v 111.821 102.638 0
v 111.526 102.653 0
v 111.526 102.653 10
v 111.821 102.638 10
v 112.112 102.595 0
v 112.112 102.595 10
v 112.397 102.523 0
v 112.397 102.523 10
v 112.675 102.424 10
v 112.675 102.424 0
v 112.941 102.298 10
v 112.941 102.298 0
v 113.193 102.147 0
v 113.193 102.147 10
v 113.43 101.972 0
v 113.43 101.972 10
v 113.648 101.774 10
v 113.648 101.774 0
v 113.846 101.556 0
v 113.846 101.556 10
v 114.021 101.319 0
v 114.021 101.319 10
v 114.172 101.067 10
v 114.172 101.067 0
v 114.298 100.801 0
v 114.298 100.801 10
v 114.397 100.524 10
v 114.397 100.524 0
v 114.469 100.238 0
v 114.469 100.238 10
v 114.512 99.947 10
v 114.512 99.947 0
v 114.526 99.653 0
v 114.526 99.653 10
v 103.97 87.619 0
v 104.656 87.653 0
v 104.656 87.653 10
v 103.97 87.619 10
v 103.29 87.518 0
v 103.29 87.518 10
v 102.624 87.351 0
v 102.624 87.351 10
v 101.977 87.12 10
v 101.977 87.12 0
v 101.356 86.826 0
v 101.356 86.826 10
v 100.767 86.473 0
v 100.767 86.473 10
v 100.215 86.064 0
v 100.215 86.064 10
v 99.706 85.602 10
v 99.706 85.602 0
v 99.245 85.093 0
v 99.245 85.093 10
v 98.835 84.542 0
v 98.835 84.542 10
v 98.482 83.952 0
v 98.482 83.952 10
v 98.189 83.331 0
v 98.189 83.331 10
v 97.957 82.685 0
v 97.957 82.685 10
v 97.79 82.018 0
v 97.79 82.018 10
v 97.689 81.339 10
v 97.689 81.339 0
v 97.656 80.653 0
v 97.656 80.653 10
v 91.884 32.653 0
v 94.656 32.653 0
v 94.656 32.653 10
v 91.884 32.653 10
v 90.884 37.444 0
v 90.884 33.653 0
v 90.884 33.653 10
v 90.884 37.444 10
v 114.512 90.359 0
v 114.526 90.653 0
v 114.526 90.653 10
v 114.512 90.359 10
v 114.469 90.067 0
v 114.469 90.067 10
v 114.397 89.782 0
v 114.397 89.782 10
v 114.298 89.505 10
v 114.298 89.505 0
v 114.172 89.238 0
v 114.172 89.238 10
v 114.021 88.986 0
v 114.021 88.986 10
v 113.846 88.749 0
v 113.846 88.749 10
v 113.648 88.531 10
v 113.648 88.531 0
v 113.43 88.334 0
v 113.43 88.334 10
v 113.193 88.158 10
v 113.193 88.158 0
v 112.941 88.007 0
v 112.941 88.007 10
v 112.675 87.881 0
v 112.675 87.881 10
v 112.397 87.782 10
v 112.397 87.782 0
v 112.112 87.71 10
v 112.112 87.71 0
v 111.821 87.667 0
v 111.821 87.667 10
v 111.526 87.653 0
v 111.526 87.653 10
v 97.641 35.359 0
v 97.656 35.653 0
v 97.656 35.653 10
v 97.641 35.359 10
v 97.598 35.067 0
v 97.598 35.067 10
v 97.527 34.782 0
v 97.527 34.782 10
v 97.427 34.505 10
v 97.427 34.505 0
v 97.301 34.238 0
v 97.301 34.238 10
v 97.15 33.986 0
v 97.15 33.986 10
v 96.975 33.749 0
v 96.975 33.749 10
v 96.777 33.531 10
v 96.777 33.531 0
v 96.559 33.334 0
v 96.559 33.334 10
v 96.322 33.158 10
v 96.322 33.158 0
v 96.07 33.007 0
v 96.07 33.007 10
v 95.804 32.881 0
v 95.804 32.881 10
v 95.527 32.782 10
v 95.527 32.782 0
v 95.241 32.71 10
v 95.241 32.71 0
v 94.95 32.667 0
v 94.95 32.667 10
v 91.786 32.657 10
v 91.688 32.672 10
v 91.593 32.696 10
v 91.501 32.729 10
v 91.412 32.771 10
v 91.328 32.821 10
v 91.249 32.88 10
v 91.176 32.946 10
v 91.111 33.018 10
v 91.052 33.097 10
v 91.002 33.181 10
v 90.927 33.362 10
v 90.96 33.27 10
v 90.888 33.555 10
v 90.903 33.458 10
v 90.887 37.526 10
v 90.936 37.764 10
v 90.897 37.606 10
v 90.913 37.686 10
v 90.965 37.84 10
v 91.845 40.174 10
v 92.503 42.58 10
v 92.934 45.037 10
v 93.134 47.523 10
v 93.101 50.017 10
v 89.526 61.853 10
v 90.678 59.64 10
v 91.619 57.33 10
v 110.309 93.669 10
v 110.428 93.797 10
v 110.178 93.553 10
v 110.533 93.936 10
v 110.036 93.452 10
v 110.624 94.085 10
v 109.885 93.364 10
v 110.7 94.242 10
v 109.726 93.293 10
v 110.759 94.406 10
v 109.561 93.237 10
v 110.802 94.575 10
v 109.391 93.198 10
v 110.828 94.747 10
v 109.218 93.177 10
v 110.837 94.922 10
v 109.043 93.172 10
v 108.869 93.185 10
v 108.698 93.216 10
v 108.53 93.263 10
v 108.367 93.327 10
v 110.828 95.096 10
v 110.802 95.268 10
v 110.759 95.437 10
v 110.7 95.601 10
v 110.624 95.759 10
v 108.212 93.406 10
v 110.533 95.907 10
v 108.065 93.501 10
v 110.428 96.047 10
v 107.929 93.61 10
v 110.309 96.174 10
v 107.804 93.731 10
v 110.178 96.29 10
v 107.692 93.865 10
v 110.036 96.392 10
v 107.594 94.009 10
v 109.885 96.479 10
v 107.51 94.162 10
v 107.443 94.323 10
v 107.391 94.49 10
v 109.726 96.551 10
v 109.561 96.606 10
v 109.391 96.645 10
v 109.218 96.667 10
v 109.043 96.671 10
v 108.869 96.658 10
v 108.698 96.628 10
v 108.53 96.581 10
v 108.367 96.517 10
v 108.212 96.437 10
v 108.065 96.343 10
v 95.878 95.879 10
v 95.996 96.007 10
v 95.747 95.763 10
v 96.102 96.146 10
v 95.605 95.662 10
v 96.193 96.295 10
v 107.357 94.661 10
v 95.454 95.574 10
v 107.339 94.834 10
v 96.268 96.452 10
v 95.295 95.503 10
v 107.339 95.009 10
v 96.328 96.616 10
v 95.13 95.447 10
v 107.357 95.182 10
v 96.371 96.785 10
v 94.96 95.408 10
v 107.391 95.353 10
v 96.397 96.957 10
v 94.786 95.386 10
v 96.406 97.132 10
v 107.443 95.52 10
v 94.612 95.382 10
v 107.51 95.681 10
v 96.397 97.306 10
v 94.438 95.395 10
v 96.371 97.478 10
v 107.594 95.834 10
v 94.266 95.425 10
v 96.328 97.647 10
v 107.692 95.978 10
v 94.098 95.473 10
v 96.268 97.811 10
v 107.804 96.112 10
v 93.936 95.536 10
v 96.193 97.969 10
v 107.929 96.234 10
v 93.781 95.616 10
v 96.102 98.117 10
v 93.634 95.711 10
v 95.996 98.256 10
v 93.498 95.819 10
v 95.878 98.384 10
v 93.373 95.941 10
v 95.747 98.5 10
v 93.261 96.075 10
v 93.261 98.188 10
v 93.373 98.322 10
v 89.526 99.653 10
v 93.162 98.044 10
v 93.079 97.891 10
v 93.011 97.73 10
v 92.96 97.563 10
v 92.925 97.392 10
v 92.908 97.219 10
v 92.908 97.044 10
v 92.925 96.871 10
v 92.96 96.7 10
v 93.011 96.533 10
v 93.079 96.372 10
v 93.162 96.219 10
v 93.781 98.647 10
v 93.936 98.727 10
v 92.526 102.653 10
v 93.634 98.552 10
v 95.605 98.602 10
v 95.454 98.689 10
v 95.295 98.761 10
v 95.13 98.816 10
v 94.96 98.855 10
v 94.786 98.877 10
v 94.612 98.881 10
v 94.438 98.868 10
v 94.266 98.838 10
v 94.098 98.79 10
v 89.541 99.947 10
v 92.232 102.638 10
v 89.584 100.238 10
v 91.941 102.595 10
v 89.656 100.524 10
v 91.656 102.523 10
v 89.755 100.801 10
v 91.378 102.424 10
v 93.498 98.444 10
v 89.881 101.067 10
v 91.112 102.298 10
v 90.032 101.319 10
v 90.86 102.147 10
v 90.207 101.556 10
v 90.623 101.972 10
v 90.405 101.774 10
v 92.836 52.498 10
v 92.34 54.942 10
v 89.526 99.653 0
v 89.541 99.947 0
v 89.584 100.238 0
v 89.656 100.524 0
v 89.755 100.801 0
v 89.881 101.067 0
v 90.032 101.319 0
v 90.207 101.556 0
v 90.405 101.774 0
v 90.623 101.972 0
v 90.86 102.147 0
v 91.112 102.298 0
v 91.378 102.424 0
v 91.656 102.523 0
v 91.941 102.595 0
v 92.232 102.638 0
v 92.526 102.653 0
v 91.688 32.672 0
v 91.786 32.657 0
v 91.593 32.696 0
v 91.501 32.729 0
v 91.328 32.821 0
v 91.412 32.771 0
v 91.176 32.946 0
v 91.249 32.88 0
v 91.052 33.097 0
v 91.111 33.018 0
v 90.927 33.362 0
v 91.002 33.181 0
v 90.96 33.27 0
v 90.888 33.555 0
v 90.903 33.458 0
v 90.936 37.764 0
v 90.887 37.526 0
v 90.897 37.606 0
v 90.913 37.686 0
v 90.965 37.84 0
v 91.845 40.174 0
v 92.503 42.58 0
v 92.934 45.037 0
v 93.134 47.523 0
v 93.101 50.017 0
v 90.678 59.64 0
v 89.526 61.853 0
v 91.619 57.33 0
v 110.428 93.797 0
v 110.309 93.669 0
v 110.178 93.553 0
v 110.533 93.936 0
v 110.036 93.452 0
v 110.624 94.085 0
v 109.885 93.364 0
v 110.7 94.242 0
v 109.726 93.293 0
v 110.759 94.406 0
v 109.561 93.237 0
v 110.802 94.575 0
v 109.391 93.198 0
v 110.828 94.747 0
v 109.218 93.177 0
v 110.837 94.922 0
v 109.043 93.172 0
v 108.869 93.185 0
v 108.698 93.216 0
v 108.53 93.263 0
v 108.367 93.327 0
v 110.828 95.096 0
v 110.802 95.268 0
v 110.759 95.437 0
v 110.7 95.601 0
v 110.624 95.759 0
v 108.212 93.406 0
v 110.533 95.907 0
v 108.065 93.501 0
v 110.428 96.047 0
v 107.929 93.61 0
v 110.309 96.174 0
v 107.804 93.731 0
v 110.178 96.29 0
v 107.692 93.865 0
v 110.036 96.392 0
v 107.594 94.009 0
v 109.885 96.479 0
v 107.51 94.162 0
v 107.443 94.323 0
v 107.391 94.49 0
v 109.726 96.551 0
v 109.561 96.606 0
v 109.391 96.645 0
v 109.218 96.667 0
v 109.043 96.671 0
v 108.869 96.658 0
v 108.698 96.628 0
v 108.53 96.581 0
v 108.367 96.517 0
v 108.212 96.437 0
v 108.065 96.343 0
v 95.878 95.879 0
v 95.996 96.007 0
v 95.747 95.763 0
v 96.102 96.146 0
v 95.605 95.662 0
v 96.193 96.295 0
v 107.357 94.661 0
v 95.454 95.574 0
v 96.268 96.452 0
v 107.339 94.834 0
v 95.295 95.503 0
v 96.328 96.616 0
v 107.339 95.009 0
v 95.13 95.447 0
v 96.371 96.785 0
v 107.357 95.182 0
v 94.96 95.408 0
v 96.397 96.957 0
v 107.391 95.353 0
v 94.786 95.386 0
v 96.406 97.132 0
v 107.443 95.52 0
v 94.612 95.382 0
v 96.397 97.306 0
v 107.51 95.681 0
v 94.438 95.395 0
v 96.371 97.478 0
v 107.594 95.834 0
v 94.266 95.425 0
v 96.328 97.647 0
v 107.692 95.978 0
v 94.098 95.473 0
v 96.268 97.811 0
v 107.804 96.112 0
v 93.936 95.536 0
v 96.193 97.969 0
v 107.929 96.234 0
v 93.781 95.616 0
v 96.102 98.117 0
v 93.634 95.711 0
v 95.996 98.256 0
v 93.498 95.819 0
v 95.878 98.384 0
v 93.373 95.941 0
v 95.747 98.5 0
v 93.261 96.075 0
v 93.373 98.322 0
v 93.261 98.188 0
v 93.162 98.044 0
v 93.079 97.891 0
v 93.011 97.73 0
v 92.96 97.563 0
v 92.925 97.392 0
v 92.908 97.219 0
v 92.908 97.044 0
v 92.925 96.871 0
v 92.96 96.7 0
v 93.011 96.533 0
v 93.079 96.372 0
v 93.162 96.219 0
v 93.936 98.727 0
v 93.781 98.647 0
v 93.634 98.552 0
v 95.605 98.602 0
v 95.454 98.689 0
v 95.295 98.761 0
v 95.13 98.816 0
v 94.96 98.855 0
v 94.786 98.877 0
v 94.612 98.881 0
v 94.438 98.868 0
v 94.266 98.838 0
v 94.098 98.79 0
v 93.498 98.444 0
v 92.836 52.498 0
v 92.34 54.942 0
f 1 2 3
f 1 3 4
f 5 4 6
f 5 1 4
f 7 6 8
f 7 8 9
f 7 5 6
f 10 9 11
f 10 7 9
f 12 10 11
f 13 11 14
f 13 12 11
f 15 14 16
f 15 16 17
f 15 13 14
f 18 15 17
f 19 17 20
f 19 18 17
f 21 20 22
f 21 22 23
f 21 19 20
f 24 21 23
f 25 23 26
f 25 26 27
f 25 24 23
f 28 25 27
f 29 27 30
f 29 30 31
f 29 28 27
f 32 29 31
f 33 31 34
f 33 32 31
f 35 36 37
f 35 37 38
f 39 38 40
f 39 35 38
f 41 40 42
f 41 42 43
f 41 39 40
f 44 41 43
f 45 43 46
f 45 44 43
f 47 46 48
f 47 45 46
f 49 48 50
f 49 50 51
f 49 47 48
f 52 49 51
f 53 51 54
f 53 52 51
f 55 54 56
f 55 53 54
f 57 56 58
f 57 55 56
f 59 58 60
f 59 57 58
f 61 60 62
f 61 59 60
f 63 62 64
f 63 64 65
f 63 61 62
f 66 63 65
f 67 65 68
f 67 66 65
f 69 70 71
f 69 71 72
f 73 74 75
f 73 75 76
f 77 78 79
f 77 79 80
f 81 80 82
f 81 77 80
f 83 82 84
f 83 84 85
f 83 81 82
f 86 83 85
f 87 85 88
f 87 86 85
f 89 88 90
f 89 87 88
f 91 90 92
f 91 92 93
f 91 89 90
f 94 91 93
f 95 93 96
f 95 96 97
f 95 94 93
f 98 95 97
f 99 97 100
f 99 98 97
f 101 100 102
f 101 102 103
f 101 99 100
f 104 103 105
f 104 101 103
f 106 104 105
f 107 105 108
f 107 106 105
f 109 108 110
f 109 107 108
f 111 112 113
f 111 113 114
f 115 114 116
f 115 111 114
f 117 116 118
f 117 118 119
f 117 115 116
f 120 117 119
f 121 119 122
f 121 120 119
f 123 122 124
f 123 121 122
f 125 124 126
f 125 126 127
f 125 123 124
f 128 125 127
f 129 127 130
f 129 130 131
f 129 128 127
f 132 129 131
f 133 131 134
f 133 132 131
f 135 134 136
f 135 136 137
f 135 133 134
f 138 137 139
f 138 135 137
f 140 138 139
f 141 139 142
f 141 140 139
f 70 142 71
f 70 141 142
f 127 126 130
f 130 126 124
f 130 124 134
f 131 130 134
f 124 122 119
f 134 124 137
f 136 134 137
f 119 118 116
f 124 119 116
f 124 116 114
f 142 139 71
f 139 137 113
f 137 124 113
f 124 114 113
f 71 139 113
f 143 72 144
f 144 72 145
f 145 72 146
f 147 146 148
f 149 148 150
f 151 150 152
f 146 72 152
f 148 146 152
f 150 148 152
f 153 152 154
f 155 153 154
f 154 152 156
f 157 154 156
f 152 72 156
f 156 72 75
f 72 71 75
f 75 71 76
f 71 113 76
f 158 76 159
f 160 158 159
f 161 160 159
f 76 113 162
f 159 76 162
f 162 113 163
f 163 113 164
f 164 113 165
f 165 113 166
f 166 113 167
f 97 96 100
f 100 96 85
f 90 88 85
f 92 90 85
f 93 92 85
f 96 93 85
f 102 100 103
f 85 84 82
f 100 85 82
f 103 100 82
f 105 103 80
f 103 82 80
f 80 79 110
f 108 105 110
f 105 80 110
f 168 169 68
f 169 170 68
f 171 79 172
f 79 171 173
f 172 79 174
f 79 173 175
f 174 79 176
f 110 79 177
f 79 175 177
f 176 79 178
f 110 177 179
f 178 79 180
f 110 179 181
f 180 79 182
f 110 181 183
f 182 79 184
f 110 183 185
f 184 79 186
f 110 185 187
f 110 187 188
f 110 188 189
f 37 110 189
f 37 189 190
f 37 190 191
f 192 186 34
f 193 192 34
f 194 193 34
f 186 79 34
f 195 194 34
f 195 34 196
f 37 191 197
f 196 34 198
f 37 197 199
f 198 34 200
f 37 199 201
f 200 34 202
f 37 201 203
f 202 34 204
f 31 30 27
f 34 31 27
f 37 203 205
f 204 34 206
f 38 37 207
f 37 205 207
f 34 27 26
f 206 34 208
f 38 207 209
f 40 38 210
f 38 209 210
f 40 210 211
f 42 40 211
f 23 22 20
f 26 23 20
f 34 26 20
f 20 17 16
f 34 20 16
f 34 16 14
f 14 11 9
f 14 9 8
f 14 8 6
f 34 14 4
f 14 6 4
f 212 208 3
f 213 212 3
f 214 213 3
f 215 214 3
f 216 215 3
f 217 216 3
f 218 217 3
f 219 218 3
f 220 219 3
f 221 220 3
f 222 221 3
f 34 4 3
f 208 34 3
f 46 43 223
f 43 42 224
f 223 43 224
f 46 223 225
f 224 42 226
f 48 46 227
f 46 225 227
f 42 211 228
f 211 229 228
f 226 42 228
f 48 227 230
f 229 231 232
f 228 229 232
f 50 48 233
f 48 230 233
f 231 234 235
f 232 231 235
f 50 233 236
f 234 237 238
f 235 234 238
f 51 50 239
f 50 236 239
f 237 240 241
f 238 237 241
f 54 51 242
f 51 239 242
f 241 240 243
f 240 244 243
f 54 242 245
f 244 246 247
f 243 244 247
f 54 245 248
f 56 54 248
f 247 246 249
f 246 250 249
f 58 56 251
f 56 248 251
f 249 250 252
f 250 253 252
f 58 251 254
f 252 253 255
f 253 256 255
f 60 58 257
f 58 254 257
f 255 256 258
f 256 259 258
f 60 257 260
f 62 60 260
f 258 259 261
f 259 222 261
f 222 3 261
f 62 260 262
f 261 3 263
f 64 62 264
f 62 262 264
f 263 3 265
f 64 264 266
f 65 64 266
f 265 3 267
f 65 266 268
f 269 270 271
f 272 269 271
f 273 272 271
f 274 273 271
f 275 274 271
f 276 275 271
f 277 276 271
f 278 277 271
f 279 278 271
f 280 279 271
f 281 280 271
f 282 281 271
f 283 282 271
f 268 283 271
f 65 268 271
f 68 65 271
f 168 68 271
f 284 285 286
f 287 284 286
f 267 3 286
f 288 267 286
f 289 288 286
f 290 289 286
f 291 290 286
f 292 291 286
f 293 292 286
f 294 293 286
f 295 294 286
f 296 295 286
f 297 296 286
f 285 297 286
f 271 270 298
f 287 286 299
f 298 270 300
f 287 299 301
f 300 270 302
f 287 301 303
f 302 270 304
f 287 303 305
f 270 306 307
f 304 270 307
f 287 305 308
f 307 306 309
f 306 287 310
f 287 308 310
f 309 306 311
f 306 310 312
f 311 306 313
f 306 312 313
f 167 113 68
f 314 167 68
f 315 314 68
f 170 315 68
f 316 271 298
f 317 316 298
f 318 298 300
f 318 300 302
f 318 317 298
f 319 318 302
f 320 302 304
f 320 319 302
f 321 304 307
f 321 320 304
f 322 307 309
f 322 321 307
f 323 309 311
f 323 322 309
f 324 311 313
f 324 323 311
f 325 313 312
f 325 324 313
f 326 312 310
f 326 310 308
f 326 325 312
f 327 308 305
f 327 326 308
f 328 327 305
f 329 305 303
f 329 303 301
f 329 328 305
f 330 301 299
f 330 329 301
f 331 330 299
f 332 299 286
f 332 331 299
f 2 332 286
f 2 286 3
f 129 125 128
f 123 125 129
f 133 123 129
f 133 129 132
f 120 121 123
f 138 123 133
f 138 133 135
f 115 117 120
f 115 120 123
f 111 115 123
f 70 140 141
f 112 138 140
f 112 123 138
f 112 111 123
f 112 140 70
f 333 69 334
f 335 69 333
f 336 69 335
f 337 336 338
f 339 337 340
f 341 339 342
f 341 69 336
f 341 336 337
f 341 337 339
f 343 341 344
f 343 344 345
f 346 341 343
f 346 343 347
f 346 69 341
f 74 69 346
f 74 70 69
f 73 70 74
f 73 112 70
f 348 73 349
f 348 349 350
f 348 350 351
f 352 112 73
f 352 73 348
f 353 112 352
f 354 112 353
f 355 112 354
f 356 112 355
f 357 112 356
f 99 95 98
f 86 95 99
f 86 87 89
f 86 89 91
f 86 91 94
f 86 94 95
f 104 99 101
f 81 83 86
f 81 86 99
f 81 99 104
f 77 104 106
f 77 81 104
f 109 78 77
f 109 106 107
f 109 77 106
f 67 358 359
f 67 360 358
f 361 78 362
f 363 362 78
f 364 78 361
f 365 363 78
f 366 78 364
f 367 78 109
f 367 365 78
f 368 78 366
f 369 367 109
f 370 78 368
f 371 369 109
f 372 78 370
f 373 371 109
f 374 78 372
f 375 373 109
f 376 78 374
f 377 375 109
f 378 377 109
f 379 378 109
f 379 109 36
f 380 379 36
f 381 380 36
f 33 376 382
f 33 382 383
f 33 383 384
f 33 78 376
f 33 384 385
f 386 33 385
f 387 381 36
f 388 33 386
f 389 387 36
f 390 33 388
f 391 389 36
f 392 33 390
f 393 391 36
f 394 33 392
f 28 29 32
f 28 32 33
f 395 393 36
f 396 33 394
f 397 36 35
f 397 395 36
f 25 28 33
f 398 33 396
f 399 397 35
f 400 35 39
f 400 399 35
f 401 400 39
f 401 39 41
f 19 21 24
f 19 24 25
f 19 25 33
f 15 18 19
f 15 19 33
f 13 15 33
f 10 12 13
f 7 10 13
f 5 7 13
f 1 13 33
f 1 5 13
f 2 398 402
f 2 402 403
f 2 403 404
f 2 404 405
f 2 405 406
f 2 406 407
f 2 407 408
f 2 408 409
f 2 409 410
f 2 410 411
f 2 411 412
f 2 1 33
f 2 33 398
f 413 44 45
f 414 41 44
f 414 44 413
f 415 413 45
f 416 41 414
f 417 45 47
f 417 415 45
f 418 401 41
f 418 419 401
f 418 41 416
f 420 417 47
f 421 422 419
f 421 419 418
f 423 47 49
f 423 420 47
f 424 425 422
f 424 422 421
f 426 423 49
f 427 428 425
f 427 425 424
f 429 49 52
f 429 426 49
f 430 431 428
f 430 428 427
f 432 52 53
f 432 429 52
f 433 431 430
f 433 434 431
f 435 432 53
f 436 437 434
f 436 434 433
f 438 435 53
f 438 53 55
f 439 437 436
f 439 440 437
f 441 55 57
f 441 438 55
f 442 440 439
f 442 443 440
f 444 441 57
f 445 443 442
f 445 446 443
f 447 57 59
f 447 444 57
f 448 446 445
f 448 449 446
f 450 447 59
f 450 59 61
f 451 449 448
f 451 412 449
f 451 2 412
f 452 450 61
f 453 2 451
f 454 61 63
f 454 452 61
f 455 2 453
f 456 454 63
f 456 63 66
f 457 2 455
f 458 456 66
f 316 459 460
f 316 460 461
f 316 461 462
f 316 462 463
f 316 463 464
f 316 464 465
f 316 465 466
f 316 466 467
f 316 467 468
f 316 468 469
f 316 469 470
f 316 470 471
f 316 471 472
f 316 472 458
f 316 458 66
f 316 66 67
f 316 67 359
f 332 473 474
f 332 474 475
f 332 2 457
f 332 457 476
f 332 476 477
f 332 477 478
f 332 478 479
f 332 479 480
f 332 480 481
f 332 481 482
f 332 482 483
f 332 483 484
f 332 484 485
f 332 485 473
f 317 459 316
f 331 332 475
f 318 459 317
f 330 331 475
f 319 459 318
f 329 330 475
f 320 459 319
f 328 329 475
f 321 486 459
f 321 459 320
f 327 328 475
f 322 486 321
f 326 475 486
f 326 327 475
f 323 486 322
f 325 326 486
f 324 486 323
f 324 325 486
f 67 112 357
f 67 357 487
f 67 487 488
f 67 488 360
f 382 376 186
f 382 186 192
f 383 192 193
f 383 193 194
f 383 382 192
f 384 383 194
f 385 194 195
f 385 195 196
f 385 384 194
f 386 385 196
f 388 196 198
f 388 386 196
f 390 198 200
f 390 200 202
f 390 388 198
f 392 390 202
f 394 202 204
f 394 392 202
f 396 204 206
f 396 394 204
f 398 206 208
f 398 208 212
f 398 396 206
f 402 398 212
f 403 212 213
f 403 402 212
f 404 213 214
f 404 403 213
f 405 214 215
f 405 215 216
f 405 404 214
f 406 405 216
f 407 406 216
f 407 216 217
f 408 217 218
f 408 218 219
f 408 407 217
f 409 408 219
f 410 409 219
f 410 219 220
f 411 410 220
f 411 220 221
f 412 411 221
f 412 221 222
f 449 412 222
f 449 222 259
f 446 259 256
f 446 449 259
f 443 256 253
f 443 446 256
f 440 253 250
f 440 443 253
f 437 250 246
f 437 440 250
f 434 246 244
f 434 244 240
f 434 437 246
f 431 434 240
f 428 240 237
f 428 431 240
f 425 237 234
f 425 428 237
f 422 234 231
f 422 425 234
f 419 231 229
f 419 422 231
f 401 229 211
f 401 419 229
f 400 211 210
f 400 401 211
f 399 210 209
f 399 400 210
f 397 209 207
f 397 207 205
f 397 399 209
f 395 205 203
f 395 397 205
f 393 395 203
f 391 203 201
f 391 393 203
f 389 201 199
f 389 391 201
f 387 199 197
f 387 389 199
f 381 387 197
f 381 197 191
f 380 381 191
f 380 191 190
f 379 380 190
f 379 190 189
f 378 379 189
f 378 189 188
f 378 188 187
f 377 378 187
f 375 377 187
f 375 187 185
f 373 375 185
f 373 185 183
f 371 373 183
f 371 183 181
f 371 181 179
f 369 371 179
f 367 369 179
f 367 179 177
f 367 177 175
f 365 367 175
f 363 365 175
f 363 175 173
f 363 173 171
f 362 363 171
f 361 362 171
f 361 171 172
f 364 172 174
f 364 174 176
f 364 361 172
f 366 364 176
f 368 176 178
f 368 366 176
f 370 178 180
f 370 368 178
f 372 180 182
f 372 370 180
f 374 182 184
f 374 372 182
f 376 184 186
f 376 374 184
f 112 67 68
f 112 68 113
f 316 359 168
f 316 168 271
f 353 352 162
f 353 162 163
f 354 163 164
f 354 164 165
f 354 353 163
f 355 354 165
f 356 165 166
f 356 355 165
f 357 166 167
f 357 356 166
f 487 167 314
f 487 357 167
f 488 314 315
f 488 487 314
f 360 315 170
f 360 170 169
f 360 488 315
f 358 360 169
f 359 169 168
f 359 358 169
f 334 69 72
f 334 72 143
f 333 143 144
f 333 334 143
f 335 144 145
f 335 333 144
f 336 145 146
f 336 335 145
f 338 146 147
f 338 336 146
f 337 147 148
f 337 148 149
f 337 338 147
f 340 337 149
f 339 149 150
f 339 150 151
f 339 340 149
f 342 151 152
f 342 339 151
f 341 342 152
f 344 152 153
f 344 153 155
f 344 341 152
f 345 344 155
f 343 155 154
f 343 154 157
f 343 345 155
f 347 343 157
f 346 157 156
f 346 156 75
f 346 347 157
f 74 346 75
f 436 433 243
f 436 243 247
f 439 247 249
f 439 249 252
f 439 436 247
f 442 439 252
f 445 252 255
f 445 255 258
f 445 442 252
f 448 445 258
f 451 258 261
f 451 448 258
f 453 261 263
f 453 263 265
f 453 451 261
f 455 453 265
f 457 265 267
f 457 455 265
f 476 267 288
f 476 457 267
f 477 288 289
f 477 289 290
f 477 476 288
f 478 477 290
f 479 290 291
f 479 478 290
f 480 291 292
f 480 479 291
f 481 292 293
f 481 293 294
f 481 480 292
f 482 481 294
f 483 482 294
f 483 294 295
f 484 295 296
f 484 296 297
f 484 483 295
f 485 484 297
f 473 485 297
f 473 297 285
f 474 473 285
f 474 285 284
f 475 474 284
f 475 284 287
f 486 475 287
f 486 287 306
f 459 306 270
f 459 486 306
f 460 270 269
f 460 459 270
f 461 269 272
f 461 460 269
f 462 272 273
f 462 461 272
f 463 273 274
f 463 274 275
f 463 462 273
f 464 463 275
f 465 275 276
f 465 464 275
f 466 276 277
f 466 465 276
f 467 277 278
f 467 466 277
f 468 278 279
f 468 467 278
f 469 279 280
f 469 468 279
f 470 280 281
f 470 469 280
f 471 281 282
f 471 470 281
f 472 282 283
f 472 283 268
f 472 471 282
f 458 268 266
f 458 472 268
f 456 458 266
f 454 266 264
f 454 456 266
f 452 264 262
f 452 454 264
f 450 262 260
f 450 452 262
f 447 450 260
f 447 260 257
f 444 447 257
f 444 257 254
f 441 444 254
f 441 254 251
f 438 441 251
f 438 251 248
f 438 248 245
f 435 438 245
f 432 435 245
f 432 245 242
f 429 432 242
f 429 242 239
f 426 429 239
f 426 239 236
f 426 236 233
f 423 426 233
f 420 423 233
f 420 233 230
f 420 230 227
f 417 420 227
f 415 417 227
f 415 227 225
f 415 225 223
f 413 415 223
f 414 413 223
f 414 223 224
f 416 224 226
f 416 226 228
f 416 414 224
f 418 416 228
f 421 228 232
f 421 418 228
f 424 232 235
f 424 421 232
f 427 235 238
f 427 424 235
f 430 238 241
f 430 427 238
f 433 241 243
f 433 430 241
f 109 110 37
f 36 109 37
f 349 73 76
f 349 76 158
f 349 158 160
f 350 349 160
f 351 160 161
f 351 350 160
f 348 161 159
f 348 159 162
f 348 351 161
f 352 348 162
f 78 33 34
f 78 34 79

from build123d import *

# Parameters (mm, degrees)
SKETCH1_R           = 1.75
BOSS_EXTRUDE1_DEPTH = 10


with BuildPart() as part:
    # Sketch1 → Boss-Extrude1 (new body)
    with BuildSketch(Plane.XY):
        with BuildLine():
            Line((92.526484321, 102.652653788), (111.526484321, 102.652653788))
            ThreePointArc((111.526484321, 102.652653788), (113.647804665, 101.773974132), (114.526484321, 99.652653788))
            Line((114.526484321, 99.652653788), (114.526484321, 90.652653788))
            ThreePointArc((114.526484321, 90.652653788), (113.647804665, 88.531333445), (111.526484321, 87.652653788))
            Line((111.526484321, 87.652653788), (104.655721469, 87.652653788))
            ThreePointArc((104.655721469, 87.652653788), (99.705974001, 85.602401257), (97.655721469, 80.652653788))
            Line((97.655721469, 80.652653788), (97.655721469, 35.652653788))
            ThreePointArc((97.655721469, 35.652653788), (96.777041813, 33.531333445), (94.655721469, 32.652653788))
            Line((94.655721469, 32.652653788), (91.883588365, 32.652653788))
            ThreePointArc((91.883588365, 32.652653788), (91.176481584, 32.945547007), (90.883588365, 33.652653788))
            Line((90.883588365, 33.652653788), (90.883588365, 37.44429483))
            ThreePointArc((90.883588365, 37.44429483), (90.904227909, 37.646416321), (90.96529456, 37.840194422))
            ThreePointArc((90.96529456, 37.840194422), (93.100756161, 50.01744431), (89.526484321, 61.852569654))
            Line((89.526484321, 61.852569654), (89.526484321, 99.652653788))
            ThreePointArc((89.526484321, 99.652653788), (90.405163978, 101.773974132), (92.526484321, 102.652653788))
        make_face()
        with Locations((94.655721469, 97.131560256)):
            Circle(SKETCH1_R, mode=Mode.SUBTRACT)
        with Locations((109.087030876, 94.921659672)):
            Circle(SKETCH1_R, mode=Mode.SUBTRACT)
    extrude(amount=BOSS_EXTRUDE1_DEPTH)


solid = part.part
